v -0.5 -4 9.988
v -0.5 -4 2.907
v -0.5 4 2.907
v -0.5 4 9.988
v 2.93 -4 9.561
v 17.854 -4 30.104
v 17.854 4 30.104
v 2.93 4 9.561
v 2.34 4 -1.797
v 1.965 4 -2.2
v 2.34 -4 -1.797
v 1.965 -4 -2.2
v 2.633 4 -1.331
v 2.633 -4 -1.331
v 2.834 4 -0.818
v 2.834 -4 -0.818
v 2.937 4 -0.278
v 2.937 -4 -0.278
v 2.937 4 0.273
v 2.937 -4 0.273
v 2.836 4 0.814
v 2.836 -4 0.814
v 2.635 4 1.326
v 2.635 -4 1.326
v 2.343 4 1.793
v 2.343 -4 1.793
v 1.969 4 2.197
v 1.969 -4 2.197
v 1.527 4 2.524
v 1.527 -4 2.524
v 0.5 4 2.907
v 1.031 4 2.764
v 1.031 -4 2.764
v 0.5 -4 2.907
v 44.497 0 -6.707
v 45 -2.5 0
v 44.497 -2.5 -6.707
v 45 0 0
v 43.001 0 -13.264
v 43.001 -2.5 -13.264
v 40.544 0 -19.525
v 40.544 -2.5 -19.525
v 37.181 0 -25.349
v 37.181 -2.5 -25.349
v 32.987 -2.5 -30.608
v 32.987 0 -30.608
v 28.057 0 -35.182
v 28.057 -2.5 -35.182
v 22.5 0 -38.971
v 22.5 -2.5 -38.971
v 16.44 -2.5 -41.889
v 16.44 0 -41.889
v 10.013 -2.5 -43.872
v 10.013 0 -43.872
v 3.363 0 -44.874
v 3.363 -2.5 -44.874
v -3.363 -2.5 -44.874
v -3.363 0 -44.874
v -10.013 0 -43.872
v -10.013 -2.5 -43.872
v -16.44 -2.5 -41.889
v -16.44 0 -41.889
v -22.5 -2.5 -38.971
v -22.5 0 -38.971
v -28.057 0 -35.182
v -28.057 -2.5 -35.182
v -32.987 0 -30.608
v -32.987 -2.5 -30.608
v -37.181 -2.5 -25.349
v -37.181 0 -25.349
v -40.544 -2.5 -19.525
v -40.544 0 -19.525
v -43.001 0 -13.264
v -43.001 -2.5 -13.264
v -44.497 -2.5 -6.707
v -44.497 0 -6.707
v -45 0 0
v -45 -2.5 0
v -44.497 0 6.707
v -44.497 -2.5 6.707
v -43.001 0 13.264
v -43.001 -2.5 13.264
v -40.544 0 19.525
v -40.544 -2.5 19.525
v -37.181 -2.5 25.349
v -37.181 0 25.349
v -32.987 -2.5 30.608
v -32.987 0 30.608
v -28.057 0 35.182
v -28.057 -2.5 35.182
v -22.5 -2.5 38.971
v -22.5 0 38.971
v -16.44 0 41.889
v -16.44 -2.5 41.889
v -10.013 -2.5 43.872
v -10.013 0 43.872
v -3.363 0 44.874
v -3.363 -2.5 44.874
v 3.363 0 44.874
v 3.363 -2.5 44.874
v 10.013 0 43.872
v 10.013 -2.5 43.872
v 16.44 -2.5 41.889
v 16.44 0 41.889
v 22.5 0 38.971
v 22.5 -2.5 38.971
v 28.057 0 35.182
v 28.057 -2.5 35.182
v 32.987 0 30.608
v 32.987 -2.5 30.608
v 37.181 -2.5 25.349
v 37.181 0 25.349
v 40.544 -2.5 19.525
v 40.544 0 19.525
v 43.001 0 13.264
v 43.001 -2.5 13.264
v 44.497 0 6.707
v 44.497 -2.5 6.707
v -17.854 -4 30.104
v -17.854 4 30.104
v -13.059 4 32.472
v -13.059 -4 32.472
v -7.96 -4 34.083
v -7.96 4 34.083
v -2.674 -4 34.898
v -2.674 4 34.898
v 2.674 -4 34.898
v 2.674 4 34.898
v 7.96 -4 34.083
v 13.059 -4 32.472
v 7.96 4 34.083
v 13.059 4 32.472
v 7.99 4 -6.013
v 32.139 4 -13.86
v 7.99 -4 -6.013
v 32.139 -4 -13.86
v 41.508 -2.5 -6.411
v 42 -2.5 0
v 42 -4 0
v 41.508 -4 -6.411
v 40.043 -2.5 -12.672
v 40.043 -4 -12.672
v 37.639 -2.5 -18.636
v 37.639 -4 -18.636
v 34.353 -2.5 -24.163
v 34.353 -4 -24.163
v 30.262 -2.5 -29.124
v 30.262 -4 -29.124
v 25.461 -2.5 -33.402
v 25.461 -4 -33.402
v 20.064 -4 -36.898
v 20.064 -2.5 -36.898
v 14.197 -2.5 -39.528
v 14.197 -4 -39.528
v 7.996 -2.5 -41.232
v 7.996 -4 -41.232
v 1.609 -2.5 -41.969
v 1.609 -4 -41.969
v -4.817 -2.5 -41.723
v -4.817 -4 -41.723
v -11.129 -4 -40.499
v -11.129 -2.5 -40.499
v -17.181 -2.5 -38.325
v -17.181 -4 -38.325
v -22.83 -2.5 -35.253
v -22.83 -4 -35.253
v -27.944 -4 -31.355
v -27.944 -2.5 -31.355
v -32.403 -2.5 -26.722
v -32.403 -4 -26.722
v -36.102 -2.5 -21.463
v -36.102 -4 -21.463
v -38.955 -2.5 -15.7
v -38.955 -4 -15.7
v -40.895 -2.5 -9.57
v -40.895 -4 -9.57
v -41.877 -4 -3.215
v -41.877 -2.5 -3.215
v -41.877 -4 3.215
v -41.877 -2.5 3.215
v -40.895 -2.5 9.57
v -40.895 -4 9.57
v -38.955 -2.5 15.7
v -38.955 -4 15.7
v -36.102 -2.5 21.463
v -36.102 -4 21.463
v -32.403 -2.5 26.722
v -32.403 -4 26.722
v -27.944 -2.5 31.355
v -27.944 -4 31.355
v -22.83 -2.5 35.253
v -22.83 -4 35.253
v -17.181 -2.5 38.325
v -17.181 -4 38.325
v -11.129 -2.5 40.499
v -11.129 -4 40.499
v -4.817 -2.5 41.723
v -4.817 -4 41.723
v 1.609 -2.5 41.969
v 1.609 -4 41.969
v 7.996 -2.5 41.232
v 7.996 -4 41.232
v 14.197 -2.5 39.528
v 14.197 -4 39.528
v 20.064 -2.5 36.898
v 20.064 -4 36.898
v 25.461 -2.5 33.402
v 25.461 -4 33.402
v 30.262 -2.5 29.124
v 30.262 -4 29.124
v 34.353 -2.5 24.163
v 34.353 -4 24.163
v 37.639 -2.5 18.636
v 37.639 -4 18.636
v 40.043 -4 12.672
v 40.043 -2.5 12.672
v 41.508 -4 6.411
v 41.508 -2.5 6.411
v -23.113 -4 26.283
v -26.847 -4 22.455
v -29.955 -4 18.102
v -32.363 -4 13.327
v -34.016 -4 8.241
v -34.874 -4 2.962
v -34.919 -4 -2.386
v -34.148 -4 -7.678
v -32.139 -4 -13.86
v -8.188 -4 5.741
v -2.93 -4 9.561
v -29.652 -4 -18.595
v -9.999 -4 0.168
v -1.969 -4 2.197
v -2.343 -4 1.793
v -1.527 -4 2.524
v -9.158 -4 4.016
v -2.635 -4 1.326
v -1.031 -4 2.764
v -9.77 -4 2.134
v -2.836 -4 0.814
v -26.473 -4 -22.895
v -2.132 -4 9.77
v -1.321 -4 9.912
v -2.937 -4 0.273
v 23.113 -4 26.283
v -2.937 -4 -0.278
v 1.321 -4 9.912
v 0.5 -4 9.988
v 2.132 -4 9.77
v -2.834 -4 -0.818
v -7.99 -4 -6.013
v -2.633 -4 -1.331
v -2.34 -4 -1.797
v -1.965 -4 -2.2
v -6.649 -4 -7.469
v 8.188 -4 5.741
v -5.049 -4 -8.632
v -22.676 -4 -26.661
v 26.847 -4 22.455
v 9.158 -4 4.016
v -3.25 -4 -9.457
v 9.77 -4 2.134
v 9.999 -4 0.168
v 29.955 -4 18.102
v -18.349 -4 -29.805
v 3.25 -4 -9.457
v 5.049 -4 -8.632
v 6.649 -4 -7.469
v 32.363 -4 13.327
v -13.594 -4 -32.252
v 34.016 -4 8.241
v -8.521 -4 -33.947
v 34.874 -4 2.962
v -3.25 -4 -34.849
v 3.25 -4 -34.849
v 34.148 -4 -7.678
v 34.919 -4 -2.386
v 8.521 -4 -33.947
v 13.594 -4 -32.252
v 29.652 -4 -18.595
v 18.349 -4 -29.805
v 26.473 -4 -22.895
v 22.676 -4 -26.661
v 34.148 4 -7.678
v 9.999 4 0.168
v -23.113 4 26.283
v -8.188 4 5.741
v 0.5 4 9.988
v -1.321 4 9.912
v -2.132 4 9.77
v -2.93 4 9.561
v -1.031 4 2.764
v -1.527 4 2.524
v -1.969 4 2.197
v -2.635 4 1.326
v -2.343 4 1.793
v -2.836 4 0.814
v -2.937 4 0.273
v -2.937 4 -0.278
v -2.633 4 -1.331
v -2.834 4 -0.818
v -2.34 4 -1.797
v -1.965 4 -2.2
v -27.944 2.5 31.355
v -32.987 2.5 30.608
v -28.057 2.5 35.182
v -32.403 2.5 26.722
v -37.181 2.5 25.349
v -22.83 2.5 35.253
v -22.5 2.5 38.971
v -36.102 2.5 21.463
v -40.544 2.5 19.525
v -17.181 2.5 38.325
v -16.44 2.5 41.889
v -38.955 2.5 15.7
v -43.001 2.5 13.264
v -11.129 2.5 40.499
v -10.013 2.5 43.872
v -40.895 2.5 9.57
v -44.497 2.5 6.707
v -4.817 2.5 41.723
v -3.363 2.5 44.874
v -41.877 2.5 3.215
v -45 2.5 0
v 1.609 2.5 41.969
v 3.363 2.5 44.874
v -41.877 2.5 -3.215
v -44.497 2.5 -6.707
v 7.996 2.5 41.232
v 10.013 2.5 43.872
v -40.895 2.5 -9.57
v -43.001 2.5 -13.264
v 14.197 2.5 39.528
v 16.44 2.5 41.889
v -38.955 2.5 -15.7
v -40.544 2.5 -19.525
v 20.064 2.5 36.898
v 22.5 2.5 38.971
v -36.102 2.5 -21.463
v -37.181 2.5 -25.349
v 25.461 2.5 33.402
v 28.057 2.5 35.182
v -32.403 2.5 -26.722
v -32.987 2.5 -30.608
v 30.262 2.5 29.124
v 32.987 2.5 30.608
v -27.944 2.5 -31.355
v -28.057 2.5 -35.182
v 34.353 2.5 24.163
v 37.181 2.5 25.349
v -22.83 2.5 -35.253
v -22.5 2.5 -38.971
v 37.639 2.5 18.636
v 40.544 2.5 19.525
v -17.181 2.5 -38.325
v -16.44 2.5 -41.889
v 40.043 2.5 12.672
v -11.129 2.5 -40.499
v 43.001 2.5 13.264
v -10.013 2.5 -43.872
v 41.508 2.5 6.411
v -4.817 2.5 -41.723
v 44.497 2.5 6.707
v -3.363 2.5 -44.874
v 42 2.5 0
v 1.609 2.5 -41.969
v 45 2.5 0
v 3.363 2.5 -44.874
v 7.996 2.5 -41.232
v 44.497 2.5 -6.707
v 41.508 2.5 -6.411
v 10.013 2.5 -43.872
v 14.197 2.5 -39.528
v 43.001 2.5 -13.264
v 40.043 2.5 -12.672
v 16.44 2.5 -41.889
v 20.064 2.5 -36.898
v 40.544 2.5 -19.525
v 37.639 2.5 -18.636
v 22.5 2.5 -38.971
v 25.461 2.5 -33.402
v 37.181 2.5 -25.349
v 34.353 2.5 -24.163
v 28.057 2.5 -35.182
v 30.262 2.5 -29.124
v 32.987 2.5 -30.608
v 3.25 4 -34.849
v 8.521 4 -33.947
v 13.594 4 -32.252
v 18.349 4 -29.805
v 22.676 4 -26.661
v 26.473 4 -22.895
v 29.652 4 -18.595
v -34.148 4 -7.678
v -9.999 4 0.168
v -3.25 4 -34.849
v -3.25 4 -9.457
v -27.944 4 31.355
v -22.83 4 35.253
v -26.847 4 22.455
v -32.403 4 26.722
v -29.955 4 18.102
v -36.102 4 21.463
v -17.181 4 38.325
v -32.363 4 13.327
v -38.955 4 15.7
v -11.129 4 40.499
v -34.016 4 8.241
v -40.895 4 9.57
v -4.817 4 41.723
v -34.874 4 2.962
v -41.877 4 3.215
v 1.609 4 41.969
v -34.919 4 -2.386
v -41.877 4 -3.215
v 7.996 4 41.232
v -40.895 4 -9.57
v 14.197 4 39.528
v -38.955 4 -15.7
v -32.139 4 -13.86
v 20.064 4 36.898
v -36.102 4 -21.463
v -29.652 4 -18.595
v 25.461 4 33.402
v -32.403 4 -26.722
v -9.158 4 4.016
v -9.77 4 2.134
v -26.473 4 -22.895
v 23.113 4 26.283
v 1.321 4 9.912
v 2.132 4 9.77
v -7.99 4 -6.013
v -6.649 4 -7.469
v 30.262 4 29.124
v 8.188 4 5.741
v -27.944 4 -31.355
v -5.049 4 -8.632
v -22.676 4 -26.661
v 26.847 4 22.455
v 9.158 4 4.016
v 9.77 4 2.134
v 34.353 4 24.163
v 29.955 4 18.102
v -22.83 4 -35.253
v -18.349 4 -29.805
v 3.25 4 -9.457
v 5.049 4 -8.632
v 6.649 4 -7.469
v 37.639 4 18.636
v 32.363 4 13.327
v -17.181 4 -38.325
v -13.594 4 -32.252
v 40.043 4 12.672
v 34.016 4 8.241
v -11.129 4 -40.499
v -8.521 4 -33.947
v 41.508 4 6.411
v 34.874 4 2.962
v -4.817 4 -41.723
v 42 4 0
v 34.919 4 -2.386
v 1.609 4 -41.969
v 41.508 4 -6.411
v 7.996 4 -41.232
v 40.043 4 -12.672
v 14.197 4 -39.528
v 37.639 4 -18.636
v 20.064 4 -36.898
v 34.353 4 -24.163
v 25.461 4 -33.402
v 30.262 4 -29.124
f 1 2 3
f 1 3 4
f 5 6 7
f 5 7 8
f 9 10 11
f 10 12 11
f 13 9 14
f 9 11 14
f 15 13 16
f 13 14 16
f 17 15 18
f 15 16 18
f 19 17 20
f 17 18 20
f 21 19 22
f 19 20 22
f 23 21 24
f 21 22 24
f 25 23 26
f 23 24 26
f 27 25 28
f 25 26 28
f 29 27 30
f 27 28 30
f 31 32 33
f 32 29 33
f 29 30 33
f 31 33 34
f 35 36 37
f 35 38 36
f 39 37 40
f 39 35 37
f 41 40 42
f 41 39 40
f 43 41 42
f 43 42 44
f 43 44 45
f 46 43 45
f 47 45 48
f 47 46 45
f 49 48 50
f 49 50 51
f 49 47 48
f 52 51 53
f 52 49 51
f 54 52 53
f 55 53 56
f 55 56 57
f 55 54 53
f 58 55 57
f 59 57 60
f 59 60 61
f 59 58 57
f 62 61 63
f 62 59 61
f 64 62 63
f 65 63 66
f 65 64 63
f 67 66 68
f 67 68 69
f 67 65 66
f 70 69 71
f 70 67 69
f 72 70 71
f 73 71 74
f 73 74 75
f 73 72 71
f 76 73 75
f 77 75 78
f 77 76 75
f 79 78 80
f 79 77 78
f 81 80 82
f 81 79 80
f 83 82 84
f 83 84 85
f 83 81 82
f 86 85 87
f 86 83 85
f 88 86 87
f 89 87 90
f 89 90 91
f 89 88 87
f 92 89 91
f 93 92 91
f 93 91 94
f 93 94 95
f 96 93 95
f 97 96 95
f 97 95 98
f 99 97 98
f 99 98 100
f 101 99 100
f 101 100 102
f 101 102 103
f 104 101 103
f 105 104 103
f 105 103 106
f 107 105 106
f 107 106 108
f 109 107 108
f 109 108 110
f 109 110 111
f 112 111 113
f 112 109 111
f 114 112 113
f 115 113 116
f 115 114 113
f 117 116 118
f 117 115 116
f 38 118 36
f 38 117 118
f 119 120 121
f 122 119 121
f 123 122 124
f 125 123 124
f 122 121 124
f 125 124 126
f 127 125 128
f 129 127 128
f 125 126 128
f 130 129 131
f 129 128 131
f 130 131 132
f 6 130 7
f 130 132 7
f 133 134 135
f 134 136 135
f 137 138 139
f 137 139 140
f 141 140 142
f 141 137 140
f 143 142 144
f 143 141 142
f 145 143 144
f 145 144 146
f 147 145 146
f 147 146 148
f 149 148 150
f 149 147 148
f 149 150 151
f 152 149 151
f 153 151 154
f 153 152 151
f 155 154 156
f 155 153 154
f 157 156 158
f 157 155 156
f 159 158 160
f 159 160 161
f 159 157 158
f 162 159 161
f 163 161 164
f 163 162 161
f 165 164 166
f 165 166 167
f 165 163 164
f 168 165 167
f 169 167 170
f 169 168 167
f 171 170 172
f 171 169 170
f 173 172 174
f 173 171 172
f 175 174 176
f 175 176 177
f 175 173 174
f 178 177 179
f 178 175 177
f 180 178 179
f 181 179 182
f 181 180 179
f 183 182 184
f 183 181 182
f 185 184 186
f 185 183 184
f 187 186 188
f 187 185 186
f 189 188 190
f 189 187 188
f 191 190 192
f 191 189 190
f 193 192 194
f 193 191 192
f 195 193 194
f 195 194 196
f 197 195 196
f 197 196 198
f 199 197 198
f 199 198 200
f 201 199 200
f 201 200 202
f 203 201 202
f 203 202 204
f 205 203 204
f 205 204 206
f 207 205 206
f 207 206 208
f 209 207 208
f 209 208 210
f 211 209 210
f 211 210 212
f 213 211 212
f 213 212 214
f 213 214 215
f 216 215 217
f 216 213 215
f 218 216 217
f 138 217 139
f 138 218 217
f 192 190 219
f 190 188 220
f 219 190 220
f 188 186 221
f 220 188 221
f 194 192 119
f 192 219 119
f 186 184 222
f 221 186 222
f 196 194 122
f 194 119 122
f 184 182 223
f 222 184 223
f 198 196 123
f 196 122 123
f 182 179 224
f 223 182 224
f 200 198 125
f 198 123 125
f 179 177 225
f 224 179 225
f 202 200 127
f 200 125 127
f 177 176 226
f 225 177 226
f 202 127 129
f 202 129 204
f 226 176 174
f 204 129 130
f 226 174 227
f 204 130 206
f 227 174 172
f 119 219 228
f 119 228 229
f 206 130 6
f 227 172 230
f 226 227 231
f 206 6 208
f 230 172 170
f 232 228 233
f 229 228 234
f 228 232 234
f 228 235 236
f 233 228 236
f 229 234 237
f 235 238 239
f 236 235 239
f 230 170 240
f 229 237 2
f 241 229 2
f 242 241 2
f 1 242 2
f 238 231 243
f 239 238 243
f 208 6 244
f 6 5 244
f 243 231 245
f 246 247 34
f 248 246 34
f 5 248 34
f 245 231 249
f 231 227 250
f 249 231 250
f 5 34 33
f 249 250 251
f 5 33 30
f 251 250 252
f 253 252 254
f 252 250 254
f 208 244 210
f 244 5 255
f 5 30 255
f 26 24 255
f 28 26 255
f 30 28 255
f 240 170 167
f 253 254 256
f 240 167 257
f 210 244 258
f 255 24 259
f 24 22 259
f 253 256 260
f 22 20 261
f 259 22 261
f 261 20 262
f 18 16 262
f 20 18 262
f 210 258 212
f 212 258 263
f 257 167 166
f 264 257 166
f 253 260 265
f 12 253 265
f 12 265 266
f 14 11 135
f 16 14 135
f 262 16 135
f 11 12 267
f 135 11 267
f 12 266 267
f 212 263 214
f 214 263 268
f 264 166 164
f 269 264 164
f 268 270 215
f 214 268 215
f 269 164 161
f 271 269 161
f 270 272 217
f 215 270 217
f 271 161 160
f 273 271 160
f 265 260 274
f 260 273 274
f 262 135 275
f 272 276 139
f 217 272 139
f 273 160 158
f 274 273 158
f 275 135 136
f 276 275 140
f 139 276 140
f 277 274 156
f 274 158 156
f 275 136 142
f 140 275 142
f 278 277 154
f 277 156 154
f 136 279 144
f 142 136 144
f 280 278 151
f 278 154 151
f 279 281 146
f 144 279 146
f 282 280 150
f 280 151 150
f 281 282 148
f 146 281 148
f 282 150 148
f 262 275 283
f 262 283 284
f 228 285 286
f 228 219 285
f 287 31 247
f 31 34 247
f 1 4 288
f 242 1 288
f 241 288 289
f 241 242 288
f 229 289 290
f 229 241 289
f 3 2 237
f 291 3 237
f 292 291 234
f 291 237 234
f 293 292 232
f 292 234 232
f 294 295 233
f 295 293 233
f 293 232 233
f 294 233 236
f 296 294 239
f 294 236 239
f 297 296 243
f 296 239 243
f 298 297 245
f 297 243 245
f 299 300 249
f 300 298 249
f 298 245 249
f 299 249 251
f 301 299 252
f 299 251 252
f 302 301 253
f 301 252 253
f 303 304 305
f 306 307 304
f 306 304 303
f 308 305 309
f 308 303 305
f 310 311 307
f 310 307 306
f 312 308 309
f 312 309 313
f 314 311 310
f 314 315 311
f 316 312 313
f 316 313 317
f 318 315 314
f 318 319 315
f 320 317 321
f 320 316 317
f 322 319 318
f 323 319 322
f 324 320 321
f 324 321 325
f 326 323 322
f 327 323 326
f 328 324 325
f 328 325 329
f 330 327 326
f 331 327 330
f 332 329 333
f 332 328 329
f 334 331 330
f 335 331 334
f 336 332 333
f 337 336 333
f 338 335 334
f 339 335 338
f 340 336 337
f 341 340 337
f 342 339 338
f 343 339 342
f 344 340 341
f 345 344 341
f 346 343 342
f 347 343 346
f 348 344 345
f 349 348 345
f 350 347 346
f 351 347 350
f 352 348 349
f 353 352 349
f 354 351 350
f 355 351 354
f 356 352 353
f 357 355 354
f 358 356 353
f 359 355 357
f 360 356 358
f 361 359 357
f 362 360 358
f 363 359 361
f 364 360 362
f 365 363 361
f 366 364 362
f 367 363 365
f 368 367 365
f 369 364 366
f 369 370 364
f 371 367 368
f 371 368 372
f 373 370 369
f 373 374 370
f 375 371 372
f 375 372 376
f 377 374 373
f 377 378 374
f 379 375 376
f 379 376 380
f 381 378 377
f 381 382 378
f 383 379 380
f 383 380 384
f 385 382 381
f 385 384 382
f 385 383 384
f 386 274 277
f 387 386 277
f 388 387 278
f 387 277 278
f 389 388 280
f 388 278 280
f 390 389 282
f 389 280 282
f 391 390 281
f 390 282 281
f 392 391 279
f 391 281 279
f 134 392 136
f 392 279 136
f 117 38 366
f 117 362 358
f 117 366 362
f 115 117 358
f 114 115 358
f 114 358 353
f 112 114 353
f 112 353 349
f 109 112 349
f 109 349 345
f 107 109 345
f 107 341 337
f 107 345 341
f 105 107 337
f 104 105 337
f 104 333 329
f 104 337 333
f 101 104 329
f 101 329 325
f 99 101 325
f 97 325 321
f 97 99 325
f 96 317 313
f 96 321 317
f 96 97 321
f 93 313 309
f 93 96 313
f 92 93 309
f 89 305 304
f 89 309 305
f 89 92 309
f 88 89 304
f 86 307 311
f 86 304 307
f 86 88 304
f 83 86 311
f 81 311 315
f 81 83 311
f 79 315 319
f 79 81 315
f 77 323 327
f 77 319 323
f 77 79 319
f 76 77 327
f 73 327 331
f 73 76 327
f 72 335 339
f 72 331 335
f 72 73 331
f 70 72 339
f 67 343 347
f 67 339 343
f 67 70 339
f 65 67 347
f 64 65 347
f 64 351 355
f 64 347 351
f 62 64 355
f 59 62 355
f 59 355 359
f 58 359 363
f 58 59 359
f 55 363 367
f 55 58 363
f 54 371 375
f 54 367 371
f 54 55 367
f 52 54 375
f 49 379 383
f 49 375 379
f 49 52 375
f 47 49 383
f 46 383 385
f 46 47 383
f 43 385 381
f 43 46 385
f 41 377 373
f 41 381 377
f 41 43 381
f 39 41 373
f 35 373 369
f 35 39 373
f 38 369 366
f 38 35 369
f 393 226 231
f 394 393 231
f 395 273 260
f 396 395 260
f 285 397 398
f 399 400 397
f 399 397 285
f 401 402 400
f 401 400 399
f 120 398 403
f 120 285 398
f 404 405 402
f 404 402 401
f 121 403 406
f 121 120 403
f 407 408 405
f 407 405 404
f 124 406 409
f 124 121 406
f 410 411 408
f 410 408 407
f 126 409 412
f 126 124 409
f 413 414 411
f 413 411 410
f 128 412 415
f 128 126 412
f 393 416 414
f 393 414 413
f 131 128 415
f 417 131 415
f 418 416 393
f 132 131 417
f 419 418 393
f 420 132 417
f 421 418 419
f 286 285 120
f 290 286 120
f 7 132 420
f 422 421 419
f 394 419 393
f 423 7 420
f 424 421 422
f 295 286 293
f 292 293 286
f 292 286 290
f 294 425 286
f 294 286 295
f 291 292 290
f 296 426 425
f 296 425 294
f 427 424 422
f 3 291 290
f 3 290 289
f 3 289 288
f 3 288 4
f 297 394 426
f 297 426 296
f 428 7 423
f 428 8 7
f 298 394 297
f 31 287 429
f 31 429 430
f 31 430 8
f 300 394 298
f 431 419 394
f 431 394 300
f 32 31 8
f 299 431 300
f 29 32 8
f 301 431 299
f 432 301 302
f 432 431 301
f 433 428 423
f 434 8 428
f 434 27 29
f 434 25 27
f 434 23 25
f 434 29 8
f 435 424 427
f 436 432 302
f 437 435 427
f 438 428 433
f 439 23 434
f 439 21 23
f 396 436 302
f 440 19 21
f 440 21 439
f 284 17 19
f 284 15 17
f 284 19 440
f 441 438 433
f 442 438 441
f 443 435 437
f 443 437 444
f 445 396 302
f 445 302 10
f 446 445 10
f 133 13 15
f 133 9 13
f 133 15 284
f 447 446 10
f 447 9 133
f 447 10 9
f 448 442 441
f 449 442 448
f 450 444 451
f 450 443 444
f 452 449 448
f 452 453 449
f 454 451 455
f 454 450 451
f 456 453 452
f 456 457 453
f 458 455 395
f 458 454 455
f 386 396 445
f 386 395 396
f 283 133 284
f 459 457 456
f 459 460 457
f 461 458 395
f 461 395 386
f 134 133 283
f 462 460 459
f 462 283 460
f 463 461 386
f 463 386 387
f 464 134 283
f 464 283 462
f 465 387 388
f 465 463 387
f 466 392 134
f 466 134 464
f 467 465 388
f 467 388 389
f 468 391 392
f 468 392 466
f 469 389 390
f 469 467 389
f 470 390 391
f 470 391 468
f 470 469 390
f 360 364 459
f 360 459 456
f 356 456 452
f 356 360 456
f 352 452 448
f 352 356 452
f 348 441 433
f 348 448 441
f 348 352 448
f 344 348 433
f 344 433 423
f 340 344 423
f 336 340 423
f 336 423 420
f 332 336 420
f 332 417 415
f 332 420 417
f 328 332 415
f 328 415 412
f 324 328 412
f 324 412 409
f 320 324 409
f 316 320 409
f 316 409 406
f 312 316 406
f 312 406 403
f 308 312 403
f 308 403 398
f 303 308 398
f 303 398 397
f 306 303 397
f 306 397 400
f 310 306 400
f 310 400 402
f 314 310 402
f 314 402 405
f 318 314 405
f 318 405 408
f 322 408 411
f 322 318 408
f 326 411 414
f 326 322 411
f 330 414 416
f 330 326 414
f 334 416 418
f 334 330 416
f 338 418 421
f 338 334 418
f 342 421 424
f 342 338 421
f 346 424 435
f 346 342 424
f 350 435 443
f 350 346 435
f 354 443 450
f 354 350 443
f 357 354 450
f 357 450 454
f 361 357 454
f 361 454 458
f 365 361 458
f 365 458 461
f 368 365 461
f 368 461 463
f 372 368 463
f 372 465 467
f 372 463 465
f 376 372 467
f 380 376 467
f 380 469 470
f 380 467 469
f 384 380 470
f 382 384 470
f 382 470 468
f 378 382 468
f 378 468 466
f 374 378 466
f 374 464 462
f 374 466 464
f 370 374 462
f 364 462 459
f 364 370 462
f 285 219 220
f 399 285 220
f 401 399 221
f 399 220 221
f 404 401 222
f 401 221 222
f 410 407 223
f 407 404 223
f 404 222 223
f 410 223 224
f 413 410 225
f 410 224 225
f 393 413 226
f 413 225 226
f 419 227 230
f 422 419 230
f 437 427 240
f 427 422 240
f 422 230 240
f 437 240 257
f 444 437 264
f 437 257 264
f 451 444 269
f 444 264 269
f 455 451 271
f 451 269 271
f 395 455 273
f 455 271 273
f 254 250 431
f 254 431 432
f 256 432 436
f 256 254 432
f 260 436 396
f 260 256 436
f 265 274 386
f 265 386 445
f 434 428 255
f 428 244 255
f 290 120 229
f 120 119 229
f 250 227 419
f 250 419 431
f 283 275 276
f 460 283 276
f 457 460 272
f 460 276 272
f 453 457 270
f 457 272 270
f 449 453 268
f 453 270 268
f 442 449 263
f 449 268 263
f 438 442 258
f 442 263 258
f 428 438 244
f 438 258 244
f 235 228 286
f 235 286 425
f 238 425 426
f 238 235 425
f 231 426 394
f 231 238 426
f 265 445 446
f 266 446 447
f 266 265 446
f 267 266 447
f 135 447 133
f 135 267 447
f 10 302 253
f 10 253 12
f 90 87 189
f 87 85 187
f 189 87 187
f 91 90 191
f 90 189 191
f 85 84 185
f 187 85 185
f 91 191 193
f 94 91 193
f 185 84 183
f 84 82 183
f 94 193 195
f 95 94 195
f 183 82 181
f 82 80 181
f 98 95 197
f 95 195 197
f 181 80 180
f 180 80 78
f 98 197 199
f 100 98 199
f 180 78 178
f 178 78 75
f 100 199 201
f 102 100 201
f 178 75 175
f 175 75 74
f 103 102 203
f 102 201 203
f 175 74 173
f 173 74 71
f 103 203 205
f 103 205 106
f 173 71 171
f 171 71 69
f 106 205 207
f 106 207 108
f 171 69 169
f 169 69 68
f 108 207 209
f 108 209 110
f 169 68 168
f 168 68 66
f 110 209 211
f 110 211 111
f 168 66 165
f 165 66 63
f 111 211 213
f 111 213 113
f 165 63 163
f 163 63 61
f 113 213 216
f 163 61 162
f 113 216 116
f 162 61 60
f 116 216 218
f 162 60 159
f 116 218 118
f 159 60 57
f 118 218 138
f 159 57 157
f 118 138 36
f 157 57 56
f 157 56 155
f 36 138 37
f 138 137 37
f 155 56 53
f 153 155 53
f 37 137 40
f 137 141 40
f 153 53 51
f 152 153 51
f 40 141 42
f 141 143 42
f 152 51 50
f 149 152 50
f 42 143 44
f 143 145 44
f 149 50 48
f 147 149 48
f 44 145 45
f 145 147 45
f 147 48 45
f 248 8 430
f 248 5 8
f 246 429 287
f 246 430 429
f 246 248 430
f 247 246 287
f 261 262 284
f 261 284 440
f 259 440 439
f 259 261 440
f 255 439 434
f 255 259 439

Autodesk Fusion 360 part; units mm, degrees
sketch "Sketch1" plane through (0, 0, 0) normal (0, 1, 0) x (1, 0, 0)
  circle A0 centre (0, 0) radius 45
  circle A1 centre (0, 0) radius 2.95
  line L0 (-1.9653, 2.2) -> (1.9653, 2.2)
  circle A2 centre (0, 0) radius 35
  circle A3 centre (0, 0) radius 10
  line L1 (-3.25, 34.8488) -> (-3.25, 9.4571)
  line L2 (3.25, 34.8488) -> (3.25, 9.4571)
  line L3 (-34.1475, 7.6779) -> (-9.9986, -0.1685)
  line L4 (-32.1389, 13.8598) -> (-7.99, 6.0134)
  line L5 (-17.8543, -30.1036) -> (-2.9295, -9.5613)
  line L6 (-23.1129, -26.283) -> (-8.1881, -5.7407)
  line L7 (23.1129, -26.283) -> (8.1881, -5.7407)
  line L8 (17.8543, -30.1036) -> (2.9295, -9.5613)
  line L9 (32.1389, 13.8598) -> (7.99, 6.0134)
  line L10 (34.1475, 7.6779) -> (9.9986, -0.1685)
  line L11 (-0.5, -2.9073) -> (-0.5, -9.9875)
  line L12 (0.5, -2.9073) -> (0.5, -9.9875)
  circle A4 centre (0, 0) radius 42
  dimension "d1" = 90
  dimension "d2" = 5.9
  dimension "d3" = 2.2
  dimension "d4" = 70
  dimension "d5" = 20
  dimension "d6" = 6.5
  dimension "d8" = 360
  dimension "d9" = 1
  dimension "d10" = 84
  dimension "d25" = 25.3916
  dimension "d26" = 20
extrude "Extrude1" add sketch "Sketch1" along normal mid plane 5 contours A0
extrude "Extrude2" add sketch "Sketch1" along normal mid plane 8 contours A4
extrude "Extrude6" add sketch "Sketch1" along normal mid plane 8 contours A1 A3 L11 L12 | A1 L0 | A2 A3 L7 L8 | A2 A3 L5 L6 | A2 A3 L9 L10 | A2 A3 L3 L4 | A2 A3 L1 L2 picked at (5.7516, 5.0158) picked at (-0.1692, 2.4959)
extrude "Extrude7" add sketch "Sketch1" along normal blind 4 contours A1 A3 L11 L12 | A1 L0 picked at (5.7516, 5.0158) picked at (-0.1692, 2.4959)
